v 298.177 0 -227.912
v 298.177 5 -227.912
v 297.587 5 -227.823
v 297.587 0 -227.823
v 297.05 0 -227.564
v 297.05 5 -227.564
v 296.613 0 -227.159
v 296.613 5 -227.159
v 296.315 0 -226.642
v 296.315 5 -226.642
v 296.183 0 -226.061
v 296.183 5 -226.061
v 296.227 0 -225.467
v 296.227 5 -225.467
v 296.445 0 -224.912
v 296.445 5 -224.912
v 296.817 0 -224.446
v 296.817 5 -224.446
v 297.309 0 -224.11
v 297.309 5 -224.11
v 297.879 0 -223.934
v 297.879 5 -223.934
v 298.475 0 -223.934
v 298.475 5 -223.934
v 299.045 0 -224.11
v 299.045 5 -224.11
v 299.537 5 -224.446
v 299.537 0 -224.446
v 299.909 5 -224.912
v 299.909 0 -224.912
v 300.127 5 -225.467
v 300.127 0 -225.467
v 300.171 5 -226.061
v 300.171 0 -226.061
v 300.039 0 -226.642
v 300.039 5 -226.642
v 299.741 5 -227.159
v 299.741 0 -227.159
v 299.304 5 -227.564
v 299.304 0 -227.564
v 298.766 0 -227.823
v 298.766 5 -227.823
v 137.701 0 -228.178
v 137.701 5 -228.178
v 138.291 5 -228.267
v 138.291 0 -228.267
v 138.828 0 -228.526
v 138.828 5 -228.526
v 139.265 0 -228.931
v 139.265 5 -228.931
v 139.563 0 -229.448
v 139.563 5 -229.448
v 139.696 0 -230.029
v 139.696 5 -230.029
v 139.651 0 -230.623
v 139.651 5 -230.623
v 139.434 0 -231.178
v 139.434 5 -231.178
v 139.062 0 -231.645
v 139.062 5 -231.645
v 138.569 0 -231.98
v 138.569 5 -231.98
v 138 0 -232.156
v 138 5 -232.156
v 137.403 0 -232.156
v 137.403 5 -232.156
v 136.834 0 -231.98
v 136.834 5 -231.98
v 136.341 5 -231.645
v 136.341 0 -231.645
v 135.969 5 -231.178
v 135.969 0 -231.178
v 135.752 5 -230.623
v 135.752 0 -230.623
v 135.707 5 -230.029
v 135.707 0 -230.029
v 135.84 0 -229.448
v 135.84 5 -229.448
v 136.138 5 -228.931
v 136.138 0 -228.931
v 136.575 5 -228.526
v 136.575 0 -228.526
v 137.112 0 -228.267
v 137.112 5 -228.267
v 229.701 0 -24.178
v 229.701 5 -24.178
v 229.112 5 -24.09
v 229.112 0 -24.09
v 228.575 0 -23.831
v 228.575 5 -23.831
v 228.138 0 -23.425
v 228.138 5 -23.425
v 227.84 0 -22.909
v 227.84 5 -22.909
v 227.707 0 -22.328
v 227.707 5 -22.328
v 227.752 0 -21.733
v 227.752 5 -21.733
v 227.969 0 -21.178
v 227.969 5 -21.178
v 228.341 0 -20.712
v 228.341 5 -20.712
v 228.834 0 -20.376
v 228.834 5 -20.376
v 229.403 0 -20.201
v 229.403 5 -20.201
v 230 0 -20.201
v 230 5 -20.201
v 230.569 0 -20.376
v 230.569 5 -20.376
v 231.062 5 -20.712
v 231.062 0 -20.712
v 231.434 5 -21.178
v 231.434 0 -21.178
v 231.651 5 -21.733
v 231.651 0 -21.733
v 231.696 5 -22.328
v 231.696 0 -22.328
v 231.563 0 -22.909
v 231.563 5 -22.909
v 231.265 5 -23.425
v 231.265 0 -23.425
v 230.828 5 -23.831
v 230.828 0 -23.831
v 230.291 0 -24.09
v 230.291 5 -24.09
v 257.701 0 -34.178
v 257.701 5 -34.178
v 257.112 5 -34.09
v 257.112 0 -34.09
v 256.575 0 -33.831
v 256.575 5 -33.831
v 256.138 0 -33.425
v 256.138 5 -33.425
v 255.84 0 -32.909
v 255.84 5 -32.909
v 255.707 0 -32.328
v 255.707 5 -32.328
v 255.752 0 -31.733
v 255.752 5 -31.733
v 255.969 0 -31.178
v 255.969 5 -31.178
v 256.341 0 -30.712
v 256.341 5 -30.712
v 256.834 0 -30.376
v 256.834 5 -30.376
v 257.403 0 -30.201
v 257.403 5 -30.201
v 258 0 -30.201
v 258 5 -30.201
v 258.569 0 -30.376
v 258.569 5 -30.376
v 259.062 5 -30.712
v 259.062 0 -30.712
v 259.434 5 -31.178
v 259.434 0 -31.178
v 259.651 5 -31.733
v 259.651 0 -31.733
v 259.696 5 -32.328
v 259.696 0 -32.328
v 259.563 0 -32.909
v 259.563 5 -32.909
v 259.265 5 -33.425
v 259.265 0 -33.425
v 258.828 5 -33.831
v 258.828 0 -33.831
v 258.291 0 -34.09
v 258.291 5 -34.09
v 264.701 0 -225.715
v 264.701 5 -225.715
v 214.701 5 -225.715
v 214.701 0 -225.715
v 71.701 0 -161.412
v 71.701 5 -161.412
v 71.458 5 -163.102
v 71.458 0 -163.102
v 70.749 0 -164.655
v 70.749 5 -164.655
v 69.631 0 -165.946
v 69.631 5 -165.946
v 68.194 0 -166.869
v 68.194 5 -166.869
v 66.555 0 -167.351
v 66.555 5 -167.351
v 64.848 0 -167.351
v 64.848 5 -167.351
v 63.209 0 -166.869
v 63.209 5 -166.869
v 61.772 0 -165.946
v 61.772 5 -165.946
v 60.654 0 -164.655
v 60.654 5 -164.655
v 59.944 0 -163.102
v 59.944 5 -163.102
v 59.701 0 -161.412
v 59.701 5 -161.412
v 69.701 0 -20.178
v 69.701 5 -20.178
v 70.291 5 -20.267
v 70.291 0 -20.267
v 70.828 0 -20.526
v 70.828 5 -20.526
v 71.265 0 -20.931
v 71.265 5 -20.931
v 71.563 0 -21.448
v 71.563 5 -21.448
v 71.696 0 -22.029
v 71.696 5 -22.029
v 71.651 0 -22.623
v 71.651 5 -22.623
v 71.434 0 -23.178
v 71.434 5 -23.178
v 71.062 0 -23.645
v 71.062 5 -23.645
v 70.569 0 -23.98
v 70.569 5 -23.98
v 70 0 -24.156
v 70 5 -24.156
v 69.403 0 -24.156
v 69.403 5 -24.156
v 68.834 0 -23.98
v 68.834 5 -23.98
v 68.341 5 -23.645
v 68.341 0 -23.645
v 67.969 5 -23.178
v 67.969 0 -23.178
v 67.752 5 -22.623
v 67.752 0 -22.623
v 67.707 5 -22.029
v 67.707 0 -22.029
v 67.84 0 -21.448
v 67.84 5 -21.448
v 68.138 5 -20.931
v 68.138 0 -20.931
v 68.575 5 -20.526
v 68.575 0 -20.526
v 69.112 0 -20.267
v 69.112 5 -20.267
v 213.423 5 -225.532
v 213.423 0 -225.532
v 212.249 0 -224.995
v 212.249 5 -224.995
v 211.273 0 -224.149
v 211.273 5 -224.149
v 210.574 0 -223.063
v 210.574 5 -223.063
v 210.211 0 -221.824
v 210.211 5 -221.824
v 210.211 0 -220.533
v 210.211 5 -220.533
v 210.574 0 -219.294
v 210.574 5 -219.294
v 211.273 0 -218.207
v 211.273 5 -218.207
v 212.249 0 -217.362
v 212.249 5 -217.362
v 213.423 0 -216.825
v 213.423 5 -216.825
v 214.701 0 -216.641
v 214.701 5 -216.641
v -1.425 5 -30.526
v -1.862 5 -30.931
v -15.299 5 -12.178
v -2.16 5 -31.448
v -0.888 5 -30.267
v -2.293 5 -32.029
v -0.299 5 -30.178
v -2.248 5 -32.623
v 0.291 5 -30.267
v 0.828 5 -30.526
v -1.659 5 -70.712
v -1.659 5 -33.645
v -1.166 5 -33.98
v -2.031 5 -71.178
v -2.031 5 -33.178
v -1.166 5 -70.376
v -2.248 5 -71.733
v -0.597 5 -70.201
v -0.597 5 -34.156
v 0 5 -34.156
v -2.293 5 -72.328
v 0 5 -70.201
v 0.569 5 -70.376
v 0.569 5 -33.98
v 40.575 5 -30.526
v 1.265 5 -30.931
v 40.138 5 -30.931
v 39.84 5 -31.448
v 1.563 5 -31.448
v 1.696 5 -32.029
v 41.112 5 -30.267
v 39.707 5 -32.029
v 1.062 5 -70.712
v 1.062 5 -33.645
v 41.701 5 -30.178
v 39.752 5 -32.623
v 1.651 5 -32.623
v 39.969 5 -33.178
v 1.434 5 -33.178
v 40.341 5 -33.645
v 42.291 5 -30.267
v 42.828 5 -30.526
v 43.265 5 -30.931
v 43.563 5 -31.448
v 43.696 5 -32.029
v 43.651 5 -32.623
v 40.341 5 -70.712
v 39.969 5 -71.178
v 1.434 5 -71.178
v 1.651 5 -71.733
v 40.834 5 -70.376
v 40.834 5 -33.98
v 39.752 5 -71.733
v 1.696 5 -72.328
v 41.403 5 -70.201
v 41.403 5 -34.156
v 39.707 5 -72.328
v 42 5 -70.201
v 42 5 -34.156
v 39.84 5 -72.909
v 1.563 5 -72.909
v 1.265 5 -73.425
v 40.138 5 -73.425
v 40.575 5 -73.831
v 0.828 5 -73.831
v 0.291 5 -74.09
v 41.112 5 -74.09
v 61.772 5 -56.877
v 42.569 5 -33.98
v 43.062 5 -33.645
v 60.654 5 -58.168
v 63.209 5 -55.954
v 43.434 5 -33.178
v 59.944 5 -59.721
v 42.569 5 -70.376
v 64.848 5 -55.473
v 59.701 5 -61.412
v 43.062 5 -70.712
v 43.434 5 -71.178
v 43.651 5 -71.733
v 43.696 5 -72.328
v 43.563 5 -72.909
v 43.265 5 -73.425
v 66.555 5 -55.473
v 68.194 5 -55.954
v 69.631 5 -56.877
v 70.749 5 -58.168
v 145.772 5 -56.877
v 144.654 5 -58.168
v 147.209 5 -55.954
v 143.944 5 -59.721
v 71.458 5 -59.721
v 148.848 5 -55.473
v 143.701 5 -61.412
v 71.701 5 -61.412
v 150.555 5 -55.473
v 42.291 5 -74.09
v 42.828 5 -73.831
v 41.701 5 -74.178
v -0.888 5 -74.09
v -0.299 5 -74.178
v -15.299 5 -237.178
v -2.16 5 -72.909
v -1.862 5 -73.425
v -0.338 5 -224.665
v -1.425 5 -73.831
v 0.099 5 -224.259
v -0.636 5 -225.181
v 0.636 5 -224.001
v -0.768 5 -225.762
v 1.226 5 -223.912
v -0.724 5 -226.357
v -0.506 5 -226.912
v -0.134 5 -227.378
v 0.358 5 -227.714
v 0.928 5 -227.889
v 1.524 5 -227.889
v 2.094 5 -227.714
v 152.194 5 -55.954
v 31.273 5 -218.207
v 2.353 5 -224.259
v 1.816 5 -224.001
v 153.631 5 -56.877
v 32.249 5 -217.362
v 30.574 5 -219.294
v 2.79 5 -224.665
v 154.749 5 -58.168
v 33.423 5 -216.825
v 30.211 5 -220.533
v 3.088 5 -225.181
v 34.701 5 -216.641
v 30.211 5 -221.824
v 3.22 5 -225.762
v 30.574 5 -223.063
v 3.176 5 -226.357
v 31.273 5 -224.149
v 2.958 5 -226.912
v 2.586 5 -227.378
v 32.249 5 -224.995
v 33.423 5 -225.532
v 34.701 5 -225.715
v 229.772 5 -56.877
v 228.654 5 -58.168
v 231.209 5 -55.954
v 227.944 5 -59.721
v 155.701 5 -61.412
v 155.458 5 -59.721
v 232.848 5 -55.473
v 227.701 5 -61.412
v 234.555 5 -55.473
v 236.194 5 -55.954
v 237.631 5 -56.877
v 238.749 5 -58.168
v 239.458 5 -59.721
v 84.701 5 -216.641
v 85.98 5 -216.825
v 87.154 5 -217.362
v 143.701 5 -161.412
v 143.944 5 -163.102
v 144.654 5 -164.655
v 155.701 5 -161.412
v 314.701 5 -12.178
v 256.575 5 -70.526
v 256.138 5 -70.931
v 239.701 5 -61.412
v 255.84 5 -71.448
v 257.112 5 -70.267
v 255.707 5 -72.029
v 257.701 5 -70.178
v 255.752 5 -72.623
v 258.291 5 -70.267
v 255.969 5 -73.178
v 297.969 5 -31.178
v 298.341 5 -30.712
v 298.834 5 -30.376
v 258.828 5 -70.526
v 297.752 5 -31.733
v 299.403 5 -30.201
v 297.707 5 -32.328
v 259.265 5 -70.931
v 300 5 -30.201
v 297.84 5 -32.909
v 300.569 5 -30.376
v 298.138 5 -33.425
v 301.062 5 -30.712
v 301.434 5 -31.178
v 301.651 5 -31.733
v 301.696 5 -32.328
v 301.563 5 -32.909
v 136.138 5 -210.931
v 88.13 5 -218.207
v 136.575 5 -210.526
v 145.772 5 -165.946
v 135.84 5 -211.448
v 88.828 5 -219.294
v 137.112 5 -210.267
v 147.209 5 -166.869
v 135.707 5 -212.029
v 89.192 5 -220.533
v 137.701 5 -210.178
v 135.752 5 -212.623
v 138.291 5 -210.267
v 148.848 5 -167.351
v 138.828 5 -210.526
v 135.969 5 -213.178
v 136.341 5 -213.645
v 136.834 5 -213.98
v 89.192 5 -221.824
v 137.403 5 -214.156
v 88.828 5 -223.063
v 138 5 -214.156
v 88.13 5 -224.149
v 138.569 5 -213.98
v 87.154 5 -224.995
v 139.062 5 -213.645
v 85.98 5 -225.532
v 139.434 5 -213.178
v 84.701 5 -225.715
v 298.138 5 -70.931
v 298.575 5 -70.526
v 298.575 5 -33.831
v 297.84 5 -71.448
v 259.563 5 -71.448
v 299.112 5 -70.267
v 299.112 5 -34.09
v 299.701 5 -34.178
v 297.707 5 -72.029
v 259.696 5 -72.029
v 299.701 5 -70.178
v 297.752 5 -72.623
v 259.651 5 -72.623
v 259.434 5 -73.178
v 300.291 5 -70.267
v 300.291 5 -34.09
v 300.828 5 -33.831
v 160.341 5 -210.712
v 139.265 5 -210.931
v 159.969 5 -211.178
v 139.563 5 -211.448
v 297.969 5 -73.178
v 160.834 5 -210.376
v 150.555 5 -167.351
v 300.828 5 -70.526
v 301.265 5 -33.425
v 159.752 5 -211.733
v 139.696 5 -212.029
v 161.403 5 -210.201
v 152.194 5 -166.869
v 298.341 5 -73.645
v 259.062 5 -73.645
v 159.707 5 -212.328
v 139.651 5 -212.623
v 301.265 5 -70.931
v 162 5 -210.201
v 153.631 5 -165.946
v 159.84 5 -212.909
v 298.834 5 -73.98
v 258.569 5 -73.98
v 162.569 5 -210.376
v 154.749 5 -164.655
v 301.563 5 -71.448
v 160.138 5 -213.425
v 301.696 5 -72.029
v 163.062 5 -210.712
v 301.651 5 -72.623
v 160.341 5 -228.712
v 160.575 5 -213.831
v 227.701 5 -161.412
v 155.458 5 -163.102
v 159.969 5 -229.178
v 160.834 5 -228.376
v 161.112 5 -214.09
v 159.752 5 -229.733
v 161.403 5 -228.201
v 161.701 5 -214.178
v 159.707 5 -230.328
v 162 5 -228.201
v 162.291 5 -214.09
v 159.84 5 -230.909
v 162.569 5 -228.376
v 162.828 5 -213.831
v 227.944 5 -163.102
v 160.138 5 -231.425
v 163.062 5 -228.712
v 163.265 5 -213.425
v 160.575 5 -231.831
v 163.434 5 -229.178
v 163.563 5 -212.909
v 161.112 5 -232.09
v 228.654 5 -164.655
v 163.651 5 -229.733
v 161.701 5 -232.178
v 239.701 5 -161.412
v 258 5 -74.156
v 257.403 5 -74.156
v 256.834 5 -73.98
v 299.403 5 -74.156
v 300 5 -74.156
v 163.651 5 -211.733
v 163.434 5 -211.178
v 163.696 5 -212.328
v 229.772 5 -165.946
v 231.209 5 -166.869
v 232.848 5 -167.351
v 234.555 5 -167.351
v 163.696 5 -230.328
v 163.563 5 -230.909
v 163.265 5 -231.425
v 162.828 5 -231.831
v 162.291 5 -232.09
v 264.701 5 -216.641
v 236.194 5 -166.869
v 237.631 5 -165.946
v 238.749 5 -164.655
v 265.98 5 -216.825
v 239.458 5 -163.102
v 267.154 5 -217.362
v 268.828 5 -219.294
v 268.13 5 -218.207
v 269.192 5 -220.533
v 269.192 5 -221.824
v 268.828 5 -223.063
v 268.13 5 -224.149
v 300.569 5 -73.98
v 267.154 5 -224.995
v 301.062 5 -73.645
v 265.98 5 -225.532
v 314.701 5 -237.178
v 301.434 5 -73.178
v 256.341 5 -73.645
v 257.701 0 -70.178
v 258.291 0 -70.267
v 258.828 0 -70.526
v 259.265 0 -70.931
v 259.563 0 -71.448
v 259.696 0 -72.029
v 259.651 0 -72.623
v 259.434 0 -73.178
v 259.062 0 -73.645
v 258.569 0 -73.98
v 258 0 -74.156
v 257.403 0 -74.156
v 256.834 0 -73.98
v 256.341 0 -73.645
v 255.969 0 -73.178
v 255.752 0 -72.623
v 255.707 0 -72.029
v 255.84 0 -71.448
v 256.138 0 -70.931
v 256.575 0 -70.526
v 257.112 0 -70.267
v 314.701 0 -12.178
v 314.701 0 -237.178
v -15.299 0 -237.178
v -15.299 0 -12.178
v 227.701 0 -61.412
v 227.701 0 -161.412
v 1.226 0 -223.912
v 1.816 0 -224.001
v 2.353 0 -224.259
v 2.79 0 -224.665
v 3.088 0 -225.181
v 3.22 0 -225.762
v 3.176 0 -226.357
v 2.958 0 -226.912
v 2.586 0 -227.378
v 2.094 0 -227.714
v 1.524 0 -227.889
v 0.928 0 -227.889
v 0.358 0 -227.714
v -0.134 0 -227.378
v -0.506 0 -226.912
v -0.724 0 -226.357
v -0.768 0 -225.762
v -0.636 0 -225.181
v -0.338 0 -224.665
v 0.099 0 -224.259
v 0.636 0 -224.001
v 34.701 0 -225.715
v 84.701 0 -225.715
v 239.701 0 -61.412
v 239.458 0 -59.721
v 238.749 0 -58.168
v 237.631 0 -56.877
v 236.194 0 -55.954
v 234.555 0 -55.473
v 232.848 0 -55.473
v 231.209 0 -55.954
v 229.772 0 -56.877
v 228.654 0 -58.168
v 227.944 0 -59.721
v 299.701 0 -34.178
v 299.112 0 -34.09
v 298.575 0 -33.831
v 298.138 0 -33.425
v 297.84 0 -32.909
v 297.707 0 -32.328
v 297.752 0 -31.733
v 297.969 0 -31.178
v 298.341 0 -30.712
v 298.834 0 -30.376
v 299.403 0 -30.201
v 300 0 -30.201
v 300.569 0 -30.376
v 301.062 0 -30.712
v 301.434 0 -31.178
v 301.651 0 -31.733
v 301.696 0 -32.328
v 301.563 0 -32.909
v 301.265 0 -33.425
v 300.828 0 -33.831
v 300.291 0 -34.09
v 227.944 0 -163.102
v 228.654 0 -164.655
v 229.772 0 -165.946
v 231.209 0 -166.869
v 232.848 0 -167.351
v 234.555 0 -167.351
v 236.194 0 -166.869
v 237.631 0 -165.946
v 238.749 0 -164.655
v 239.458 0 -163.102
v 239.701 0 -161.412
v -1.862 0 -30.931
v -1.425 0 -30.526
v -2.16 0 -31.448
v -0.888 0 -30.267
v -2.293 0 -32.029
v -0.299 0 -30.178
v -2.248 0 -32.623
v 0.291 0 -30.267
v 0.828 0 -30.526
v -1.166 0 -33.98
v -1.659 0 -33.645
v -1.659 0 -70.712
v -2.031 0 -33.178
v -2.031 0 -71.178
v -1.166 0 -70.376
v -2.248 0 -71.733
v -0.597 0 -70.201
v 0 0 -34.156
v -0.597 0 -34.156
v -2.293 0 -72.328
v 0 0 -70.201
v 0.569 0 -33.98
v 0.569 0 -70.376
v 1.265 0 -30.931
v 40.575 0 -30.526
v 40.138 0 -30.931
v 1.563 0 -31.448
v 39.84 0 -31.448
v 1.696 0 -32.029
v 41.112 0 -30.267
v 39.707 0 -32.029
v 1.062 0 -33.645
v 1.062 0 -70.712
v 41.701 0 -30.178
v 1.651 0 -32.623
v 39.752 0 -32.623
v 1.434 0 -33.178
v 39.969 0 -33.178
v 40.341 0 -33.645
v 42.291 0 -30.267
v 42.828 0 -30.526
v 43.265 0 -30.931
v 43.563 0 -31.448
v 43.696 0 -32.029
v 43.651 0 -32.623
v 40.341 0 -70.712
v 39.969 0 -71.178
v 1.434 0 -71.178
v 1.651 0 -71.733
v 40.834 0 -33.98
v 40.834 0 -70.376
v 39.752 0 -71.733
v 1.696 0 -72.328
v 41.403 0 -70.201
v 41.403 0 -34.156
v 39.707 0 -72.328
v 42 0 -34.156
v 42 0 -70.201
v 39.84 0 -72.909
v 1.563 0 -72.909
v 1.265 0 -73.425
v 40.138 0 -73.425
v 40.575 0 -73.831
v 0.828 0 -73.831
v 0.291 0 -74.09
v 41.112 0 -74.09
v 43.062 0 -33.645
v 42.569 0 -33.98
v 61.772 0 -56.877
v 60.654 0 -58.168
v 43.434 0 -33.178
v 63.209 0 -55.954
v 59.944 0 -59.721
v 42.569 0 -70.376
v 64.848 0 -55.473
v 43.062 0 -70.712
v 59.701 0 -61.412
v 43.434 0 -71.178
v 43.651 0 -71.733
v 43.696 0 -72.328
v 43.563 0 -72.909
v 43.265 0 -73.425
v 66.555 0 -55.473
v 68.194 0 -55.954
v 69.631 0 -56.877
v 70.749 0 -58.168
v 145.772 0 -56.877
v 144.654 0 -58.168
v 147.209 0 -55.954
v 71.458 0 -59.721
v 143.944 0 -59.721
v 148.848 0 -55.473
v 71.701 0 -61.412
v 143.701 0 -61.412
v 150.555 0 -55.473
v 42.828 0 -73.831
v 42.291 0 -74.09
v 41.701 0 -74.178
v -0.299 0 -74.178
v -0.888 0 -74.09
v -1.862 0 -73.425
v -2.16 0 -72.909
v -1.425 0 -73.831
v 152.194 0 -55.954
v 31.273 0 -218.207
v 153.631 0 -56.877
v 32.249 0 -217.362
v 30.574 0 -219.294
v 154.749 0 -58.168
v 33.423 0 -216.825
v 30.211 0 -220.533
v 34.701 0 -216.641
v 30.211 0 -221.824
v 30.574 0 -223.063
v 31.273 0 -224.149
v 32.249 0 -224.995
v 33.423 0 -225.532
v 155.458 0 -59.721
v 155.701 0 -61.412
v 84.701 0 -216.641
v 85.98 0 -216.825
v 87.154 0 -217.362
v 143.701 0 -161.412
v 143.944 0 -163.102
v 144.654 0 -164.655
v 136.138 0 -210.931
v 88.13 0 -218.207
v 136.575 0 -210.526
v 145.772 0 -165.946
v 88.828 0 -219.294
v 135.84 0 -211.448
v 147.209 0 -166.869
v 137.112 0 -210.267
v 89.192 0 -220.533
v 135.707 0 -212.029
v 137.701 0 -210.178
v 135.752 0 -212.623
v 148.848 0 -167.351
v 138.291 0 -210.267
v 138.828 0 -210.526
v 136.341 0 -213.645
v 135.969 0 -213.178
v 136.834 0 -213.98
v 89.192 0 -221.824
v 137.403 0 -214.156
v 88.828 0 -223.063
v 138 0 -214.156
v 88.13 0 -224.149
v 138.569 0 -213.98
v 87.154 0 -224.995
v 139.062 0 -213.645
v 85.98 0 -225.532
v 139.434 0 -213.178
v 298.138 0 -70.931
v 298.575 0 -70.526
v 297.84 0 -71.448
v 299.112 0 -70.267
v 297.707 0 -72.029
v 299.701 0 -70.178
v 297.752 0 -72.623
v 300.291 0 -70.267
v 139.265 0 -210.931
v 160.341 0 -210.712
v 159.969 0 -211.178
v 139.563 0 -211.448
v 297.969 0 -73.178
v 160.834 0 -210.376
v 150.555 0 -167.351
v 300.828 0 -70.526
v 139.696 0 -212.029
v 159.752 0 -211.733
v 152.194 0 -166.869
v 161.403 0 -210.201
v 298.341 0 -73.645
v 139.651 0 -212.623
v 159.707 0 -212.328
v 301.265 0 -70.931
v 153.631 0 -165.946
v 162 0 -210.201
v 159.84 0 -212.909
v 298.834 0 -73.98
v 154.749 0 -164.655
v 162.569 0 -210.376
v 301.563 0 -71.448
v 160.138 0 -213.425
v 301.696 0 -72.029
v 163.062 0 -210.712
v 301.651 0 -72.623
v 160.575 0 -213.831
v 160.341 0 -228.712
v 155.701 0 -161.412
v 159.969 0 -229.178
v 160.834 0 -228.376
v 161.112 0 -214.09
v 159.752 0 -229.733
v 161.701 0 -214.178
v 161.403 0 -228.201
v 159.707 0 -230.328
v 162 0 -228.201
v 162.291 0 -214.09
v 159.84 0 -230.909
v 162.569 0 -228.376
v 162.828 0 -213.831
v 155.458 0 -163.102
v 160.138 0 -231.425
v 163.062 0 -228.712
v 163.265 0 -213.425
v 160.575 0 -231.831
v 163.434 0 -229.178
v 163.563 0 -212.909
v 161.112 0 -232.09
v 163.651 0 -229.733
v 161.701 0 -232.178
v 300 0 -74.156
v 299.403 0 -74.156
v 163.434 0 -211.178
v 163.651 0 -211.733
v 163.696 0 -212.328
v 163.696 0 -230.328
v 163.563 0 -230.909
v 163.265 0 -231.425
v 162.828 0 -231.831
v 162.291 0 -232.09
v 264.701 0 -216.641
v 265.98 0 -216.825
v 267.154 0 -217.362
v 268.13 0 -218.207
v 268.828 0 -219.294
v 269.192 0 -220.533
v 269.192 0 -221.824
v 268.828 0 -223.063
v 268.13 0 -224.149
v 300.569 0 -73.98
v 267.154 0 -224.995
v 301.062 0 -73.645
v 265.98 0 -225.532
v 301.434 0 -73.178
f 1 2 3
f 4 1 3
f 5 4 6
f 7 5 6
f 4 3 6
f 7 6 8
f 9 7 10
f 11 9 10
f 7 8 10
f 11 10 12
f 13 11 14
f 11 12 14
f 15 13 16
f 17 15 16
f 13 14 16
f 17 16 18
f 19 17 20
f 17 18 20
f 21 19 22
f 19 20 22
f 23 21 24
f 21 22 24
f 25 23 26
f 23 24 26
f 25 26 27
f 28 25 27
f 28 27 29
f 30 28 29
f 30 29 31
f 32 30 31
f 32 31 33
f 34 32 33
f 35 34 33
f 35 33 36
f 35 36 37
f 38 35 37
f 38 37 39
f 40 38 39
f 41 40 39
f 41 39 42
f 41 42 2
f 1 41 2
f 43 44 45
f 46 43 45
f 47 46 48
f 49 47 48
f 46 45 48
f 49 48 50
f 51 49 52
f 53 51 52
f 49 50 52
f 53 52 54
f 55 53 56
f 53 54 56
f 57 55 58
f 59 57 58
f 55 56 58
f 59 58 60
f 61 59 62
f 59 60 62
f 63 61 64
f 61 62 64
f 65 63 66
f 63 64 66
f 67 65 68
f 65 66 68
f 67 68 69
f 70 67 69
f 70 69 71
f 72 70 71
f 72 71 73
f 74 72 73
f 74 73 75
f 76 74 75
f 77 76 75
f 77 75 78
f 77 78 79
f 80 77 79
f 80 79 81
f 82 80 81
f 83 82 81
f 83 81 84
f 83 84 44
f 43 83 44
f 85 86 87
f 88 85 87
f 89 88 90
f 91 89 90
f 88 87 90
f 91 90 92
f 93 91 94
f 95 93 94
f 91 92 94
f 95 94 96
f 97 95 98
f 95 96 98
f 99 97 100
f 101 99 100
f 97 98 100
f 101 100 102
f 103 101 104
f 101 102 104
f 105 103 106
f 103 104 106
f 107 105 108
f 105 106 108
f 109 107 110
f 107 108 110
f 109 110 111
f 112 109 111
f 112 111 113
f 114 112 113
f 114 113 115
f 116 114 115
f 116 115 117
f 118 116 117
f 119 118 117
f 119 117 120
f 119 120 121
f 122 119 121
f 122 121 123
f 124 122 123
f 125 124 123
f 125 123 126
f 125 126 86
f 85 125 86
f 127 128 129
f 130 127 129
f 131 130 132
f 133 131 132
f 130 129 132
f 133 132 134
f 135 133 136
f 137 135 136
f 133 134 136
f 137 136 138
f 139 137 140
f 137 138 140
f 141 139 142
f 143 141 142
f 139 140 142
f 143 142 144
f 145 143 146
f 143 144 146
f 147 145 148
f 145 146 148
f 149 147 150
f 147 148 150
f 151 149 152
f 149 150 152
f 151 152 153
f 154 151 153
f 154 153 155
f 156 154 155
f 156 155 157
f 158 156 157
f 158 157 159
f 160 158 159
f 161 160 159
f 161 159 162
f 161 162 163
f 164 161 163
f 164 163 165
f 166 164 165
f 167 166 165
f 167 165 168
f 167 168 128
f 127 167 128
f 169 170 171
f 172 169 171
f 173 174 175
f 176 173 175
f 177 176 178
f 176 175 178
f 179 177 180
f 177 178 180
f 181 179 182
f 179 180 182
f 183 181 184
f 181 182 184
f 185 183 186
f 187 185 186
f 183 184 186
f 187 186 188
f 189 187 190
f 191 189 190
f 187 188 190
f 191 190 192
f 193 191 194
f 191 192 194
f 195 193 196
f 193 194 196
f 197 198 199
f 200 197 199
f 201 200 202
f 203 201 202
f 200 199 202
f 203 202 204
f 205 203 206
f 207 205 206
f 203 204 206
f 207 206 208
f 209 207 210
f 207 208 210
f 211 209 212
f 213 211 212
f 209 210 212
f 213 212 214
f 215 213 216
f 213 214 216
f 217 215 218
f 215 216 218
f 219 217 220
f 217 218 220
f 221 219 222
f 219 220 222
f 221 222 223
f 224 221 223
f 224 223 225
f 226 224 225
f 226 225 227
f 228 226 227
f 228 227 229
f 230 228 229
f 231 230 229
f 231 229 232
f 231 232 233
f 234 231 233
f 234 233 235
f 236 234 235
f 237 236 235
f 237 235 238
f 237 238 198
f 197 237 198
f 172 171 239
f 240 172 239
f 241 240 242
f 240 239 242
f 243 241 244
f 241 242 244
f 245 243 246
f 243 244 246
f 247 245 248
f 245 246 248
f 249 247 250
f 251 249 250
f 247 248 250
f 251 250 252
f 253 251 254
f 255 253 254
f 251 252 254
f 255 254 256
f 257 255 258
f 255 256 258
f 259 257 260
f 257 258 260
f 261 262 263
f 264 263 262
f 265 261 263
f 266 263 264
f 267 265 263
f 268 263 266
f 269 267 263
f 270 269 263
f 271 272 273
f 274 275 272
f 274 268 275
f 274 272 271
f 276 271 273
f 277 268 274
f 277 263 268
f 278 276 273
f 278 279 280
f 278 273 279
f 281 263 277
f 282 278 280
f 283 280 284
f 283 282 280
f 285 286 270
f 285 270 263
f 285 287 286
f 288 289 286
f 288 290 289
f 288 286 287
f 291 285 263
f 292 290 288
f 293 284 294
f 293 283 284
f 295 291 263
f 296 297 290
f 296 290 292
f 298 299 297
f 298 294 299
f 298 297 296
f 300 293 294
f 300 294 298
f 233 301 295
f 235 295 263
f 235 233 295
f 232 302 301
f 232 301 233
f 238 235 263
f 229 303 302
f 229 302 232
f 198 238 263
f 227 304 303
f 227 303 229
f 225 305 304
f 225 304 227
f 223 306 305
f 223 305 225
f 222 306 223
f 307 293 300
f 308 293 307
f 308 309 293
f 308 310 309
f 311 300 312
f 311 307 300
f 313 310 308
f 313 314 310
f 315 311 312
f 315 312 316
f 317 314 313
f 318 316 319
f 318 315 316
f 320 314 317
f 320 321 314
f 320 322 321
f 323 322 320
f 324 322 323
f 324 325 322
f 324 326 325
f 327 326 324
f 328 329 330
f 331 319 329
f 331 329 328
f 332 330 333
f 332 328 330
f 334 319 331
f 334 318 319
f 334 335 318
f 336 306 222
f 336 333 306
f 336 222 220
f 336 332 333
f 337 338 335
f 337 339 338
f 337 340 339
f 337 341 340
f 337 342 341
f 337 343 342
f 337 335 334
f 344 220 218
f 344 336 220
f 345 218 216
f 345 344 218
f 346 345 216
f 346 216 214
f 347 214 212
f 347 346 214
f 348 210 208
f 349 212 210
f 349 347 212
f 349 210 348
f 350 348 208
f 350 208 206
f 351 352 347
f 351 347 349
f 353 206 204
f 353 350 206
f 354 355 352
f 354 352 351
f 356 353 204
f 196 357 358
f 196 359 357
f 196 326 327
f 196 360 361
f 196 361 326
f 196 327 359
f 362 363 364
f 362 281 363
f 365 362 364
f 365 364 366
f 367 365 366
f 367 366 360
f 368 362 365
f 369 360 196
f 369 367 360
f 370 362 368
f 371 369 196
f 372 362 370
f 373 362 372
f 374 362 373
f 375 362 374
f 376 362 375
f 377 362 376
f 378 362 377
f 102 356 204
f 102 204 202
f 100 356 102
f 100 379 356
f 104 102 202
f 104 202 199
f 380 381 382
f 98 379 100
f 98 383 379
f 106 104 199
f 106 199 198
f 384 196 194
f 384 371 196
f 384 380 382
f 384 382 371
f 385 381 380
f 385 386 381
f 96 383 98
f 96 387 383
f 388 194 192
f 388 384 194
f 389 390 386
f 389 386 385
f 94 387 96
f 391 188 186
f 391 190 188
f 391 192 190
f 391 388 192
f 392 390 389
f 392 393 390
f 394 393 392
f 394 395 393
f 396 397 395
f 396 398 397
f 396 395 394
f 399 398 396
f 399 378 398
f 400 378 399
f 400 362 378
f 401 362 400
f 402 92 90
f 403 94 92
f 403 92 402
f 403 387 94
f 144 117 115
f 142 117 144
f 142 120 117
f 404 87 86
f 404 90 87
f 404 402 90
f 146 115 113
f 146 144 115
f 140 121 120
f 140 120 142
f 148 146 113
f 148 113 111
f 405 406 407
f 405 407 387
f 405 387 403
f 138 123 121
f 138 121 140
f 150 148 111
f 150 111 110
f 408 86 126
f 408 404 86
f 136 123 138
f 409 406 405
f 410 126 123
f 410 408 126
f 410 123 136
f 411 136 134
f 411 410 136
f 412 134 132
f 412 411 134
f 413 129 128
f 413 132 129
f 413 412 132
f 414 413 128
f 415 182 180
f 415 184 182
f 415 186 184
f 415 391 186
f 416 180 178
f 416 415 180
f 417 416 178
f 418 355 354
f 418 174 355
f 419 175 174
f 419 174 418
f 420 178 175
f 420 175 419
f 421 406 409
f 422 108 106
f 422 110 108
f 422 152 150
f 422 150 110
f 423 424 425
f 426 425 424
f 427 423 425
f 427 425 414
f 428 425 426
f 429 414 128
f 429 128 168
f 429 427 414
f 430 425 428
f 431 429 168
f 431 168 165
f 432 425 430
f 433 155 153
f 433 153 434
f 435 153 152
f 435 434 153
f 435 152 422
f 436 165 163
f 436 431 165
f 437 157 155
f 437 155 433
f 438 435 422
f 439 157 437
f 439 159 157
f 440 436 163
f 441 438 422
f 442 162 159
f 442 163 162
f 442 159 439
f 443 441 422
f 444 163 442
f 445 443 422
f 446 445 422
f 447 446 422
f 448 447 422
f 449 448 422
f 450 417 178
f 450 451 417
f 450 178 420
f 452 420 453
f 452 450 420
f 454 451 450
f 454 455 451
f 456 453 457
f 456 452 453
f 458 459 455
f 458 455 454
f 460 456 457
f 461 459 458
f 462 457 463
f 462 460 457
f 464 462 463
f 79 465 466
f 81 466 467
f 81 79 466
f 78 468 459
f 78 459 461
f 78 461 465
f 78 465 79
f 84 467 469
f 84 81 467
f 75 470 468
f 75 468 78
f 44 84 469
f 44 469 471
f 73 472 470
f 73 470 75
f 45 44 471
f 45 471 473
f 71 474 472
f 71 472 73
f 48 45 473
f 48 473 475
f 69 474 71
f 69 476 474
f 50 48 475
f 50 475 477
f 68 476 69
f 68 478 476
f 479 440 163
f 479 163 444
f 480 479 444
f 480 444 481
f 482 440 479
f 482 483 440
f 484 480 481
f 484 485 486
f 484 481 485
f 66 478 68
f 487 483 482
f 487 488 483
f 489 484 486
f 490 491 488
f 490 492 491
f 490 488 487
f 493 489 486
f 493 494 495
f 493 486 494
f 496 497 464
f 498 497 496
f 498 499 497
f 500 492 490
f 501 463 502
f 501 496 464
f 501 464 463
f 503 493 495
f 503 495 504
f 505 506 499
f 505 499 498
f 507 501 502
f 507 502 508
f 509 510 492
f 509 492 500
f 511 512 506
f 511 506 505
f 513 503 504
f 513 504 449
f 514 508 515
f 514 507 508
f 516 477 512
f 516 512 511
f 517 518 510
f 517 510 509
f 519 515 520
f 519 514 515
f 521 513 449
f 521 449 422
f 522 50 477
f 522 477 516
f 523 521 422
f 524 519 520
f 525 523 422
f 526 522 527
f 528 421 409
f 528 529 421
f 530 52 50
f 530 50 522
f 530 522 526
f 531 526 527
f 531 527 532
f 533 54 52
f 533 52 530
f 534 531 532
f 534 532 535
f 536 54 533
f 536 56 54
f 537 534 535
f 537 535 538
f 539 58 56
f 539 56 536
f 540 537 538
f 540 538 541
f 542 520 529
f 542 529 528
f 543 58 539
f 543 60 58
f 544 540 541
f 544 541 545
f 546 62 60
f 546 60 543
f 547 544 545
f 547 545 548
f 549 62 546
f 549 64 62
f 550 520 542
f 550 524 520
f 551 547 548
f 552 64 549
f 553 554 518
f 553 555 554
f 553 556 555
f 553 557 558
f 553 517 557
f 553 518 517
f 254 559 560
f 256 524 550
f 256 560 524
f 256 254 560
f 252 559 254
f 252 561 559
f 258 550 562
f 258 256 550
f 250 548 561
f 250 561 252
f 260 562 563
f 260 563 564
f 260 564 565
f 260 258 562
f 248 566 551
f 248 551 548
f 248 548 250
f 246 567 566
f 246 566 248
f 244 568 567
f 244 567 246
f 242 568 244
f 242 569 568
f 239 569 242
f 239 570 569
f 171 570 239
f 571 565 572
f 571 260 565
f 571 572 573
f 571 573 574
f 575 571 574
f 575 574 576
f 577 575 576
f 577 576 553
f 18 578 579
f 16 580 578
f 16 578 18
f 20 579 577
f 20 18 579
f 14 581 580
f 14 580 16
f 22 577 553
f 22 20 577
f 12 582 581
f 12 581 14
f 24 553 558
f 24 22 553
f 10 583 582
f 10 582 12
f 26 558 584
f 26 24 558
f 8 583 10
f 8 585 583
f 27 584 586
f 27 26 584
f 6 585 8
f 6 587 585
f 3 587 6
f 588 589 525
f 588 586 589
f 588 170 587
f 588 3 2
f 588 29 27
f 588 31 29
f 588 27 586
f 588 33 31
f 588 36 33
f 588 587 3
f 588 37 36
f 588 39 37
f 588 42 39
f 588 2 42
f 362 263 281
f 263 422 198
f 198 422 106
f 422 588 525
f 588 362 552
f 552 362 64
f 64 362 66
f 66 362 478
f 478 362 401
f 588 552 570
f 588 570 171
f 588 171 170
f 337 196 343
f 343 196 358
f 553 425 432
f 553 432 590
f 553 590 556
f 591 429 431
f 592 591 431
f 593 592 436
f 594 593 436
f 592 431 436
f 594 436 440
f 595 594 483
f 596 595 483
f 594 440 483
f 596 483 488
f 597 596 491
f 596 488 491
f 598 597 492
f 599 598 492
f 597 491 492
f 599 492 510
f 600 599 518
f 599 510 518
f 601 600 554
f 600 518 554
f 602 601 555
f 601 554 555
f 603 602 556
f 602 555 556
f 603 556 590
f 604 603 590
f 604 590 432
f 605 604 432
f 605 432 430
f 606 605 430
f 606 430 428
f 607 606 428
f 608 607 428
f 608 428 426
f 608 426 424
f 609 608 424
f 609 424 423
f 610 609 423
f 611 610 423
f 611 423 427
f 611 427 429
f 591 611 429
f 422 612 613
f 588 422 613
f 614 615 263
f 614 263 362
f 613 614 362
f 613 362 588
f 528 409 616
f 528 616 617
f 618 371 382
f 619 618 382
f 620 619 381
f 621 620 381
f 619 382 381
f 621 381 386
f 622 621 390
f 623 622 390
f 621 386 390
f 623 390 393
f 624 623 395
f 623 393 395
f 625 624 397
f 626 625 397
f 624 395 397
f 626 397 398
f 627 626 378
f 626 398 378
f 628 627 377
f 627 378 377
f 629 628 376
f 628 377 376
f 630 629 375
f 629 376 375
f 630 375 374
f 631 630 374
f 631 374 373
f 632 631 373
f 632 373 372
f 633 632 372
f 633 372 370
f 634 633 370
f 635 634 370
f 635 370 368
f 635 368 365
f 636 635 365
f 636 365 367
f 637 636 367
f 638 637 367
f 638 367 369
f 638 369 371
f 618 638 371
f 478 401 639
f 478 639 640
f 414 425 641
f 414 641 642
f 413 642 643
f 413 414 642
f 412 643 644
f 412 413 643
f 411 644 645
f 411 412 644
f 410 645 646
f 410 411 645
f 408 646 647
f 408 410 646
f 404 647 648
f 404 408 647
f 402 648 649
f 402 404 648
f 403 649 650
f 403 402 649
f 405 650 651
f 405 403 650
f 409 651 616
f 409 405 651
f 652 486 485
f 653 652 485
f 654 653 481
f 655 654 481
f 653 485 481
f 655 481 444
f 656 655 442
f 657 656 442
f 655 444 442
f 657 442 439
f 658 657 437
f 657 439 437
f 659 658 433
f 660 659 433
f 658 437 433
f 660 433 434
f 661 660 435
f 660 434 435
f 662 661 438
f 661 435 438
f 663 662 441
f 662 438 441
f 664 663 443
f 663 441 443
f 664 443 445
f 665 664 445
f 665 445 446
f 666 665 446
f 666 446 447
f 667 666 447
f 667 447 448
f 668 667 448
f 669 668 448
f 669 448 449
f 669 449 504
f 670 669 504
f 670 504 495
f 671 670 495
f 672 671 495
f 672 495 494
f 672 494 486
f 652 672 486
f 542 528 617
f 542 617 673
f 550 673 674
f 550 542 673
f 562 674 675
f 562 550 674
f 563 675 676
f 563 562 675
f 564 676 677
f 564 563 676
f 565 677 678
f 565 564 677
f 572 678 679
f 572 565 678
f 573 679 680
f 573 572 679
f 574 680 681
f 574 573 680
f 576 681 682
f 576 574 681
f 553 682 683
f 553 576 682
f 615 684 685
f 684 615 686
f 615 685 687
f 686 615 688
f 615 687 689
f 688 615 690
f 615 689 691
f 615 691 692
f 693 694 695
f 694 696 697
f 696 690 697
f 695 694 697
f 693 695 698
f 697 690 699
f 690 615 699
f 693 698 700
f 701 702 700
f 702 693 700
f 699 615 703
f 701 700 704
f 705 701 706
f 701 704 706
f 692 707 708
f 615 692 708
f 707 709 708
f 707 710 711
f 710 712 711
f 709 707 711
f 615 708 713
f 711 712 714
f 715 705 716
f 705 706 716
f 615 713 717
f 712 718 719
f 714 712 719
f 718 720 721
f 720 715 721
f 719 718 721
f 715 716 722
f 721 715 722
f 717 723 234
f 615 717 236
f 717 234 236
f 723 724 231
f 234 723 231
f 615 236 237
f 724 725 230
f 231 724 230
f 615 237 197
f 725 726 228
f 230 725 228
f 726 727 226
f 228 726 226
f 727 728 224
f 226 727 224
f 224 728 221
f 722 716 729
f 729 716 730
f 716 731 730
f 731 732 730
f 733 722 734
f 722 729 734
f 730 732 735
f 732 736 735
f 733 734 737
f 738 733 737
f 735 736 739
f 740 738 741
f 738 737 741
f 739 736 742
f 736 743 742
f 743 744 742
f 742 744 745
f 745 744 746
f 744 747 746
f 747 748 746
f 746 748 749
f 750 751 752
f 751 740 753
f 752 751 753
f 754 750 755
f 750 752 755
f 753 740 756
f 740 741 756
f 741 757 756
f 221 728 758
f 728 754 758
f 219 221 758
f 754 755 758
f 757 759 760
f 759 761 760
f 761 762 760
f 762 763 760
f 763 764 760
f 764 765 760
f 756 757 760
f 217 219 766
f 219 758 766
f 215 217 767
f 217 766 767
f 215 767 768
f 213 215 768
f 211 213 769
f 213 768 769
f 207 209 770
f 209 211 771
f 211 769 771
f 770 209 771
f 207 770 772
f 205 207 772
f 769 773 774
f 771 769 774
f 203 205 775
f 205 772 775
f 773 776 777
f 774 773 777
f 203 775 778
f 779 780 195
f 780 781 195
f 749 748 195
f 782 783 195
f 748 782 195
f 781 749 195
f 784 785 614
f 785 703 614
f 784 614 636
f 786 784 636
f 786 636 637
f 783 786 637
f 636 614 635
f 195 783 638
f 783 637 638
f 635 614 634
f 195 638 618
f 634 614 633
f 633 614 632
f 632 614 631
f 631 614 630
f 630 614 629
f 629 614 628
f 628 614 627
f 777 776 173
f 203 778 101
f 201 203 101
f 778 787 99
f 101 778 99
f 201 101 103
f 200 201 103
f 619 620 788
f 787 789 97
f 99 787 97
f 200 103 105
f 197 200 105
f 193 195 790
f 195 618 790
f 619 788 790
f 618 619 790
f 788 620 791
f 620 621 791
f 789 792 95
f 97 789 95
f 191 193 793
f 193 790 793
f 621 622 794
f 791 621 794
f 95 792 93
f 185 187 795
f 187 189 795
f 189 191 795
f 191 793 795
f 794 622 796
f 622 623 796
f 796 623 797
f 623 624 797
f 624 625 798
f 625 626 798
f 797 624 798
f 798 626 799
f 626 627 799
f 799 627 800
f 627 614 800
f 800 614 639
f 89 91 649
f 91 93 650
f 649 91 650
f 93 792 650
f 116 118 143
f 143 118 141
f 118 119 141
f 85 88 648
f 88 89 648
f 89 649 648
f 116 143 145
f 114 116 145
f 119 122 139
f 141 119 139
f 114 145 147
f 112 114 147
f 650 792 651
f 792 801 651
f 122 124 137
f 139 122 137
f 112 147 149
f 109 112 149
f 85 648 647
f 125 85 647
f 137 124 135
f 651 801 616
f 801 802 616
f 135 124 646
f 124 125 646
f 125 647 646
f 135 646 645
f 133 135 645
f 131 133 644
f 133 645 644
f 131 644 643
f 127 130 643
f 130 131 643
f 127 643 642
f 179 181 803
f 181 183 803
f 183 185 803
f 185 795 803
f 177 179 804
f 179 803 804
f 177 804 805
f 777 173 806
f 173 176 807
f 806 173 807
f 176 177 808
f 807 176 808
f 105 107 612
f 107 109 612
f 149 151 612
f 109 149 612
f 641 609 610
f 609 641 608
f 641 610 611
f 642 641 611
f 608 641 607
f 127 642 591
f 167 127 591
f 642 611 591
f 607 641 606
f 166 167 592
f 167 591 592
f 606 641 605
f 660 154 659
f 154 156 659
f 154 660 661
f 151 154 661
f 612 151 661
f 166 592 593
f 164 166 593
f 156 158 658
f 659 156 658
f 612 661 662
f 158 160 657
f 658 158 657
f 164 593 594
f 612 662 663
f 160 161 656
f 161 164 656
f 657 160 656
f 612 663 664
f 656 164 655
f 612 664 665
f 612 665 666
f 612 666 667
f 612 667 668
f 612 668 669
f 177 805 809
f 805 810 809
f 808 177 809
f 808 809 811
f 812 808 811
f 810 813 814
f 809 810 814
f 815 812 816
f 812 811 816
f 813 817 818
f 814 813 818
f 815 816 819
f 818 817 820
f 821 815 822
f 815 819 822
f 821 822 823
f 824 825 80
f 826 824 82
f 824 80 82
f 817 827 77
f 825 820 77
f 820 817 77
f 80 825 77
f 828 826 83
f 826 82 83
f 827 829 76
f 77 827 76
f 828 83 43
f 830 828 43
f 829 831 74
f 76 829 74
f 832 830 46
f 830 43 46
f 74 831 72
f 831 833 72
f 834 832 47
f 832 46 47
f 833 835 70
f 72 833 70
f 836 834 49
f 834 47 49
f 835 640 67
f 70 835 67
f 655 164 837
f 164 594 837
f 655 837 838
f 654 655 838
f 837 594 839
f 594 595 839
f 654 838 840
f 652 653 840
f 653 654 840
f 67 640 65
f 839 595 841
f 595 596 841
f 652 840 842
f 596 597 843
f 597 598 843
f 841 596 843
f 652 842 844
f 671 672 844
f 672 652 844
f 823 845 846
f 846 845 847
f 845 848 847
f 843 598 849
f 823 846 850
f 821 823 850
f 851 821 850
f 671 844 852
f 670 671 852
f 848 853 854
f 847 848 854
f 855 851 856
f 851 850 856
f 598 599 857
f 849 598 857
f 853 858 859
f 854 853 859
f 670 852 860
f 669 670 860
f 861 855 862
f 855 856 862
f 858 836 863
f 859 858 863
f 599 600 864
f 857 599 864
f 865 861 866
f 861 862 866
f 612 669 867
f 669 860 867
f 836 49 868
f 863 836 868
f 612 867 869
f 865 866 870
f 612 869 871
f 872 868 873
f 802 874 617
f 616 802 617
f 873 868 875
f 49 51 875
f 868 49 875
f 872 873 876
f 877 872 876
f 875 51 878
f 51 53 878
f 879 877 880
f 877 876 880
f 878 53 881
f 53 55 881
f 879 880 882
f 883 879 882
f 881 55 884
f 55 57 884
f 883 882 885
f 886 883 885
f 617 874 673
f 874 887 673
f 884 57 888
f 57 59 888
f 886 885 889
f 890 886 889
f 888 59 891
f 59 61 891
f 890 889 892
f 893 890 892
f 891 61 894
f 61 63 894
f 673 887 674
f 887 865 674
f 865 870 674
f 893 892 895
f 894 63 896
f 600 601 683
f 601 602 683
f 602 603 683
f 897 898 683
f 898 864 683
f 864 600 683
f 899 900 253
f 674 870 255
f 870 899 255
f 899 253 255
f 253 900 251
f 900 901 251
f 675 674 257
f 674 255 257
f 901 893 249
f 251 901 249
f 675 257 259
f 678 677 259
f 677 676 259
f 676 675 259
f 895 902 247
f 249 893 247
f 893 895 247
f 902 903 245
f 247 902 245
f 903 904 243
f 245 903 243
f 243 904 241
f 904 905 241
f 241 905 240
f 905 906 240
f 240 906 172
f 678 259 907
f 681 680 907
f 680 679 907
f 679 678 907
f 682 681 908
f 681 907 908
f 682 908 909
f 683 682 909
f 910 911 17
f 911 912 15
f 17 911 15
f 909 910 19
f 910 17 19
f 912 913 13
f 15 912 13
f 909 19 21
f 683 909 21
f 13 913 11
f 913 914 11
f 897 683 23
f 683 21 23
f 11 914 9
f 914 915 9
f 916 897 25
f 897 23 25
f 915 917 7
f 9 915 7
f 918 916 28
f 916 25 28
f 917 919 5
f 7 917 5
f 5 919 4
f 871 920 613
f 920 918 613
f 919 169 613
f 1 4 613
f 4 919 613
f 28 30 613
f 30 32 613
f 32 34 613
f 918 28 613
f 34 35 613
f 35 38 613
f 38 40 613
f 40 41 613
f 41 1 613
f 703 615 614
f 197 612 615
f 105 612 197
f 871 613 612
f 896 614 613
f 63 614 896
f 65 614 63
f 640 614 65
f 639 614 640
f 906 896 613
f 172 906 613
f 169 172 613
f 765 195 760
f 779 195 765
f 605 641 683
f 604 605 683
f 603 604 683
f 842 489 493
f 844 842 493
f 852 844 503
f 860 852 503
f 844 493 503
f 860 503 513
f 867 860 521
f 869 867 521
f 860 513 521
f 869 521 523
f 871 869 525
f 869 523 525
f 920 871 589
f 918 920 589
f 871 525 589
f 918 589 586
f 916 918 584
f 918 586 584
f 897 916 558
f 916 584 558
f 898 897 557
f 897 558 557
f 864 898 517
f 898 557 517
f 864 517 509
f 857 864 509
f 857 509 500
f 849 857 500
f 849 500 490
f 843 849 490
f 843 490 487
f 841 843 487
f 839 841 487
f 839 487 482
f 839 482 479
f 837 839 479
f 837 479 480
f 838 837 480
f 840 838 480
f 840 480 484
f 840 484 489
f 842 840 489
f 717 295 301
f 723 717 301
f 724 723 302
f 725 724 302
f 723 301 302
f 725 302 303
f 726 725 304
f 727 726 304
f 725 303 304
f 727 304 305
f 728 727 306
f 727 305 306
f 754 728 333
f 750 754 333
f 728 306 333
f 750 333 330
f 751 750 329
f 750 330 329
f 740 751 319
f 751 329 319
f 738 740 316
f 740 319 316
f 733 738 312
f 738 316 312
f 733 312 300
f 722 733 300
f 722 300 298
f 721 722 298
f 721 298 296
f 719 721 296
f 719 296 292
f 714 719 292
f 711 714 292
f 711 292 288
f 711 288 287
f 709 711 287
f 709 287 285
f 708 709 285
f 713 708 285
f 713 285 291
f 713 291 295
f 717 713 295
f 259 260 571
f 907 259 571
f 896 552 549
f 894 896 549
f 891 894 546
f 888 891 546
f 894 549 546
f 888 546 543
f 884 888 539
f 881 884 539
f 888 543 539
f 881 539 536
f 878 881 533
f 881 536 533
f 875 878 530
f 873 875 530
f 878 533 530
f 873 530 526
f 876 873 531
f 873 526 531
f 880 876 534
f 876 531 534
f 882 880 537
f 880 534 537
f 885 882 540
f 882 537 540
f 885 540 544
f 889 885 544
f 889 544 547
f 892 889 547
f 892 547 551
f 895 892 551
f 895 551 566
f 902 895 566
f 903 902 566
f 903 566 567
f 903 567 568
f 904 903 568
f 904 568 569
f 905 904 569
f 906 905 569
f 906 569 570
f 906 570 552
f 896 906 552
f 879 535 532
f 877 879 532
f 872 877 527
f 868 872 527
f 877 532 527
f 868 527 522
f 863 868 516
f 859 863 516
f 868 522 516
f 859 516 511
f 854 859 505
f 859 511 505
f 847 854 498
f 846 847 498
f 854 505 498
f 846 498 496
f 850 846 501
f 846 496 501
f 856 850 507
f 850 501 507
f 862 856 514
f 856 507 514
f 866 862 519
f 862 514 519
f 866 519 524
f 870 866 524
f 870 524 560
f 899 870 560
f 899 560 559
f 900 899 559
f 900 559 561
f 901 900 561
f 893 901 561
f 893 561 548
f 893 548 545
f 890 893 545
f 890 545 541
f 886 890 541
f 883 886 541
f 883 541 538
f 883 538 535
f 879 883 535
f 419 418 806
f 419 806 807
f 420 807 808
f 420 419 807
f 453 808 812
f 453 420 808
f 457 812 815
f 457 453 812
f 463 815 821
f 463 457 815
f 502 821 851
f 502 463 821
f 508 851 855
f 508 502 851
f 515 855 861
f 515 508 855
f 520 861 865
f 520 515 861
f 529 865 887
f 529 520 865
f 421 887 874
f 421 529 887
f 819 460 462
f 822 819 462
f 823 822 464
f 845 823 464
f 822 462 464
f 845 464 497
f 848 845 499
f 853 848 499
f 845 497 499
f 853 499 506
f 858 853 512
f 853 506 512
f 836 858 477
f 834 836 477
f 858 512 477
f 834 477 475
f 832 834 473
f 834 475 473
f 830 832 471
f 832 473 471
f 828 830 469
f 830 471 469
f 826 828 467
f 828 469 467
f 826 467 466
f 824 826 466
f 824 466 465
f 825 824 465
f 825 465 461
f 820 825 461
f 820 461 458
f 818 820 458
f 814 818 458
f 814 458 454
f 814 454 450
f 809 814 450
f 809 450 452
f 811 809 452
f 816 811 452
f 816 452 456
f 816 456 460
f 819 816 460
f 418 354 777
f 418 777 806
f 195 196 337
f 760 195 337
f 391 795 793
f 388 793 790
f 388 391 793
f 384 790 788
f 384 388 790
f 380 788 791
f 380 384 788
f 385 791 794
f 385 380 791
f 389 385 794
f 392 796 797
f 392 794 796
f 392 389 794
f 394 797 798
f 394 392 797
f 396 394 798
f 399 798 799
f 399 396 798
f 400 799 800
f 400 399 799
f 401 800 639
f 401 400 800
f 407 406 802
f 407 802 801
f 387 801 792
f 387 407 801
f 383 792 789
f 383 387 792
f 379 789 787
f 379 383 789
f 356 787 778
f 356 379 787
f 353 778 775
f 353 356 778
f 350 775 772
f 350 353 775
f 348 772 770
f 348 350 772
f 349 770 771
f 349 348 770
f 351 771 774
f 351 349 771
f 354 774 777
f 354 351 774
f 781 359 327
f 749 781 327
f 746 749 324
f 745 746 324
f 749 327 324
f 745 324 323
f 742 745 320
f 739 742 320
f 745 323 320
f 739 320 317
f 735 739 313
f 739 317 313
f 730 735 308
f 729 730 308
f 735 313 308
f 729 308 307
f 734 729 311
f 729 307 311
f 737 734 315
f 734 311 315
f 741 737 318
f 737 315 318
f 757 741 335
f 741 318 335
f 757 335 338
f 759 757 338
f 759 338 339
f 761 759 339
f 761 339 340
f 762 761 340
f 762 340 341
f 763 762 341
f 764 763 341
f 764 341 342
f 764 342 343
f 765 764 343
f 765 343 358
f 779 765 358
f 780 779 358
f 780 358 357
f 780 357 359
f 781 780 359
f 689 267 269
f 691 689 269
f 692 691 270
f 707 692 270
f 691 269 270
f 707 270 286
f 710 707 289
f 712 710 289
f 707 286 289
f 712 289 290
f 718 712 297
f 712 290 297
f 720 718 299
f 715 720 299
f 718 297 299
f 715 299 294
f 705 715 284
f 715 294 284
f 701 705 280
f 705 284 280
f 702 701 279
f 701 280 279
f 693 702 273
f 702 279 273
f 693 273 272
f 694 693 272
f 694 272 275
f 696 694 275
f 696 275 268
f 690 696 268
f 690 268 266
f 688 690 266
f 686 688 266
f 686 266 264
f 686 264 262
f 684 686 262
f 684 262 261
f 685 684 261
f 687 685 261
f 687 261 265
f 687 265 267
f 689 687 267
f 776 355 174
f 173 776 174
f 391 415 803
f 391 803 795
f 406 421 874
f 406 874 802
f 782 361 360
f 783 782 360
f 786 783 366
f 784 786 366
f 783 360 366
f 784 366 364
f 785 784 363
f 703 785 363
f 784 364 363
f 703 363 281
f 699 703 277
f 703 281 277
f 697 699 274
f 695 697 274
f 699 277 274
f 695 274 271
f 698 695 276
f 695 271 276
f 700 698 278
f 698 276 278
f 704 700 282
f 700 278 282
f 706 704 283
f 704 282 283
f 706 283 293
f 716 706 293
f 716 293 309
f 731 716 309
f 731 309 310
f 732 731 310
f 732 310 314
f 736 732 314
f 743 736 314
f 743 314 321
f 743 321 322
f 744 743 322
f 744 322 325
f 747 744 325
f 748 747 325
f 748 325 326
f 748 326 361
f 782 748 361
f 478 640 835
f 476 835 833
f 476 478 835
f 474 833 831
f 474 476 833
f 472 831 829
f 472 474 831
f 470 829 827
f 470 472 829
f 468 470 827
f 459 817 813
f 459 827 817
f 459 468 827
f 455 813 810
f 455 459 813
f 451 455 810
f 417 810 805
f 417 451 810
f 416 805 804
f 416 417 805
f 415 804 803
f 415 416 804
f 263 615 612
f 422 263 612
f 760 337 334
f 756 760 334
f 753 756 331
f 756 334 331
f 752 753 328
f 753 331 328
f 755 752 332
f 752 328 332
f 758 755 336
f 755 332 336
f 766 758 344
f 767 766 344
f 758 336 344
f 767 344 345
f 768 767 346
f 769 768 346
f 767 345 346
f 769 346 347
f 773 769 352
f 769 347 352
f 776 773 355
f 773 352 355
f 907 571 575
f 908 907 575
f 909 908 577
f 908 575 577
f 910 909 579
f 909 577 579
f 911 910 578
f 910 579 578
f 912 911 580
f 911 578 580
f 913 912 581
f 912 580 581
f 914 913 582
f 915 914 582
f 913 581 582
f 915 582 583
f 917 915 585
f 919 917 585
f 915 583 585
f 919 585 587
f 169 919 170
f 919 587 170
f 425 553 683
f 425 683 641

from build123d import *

# Parameters (mm, degrees)
SKETCH_1_W          = 330
SKETCH_1_H          = 225
EXTRUDE_1_DEPTH     = 5
SKETCH_2_R          = 2
CUT_EXTRUDE_1_DEPTH = 395.101001153
SKETCH_3_R          = 2
CUT_EXTRUDE_2_DEPTH = 395.101001153
CUT_EXTRUDE_4_DEPTH = 395.101001153
SKETCH_6_R          = 2
CUT_EXTRUDE_5_DEPTH = 395.101001153


with BuildPart() as part:
    # 草图1 → 凸台-拉伸1 (new body)
    with BuildSketch(Plane(origin=(0, 0, 0), x_dir=(1, 0, 0), z_dir=(0, 1, 0))):
        with Locations((149.701456311, 124.678398058)):
            Rectangle(SKETCH_1_W, SKETCH_1_H)
    extrude(amount=EXTRUDE_1_DEPTH)

    # 草图2 → 切除-拉伸1 (cut, through all)
    with BuildSketch(Plane(origin=(0, 5, 0), x_dir=(1, 0, 0), z_dir=(0, 1, 0))):
        with Locations(Location((137.701456311, 230.178398058, 0), (0, 0, 270))):
            Circle(SKETCH_2_R)
        with Locations(Location((161.701456311, 230.178398058, 0), (0, 0, 90))):
            Circle(SKETCH_2_R)
        with Locations(Location((137.701456311, 212.178398058, 0), (0, 0, 270))):
            Circle(SKETCH_2_R)
        with Locations(Location((161.701456311, 212.178398058, 0), (0, 0, 90))):
            Circle(SKETCH_2_R)
        with BuildLine():
            Line((34.701456311, 225.715369926), (84.701456311, 225.715369926))
            ThreePointArc((84.701456311, 225.715369926), (89.238428179, 221.178398058), (84.701456311, 216.64142619))
            Line((84.701456311, 216.64142619), (34.701456311, 216.64142619))
            ThreePointArc((34.701456311, 216.64142619), (30.164484443, 221.178398058), (34.701456311, 225.715369926))
        make_face()
        with BuildLine():
            Line((264.701456311, 225.715369926), (214.701456311, 225.715369926))
            ThreePointArc((214.701456311, 225.715369926), (210.164484443, 221.178398058), (214.701456311, 216.64142619))
            Line((214.701456311, 216.64142619), (264.701456311, 216.64142619))
            ThreePointArc((264.701456311, 216.64142619), (269.238428179, 221.178398058), (264.701456311, 225.715369926))
        make_face()
    extrude(amount=-CUT_EXTRUDE_1_DEPTH, mode=Mode.SUBTRACT)

    # 草图3 → 切除-拉伸2 (cut, through all)
    with BuildSketch(Plane(origin=(0, 5, 0), x_dir=(1, 0, 0), z_dir=(0, 1, 0))):
        with Locations(Location((-0.298543689, 32.178398058, 0), (0, 0, 270))):
            Circle(SKETCH_3_R)
        with Locations(Location((-0.298543689, 72.178398058, 0), (0, 0, 90))):
            Circle(SKETCH_3_R)
        with Locations(Location((41.701456311, 32.178398058, 0), (0, 0, 270))):
            Circle(SKETCH_3_R)
        with Locations(Location((41.701456311, 72.178398058, 0), (0, 0, 90))):
            Circle(SKETCH_3_R)
        with Locations(Location((257.701456311, 72.178398058, 0), (0, 0, 270))):
            Circle(SKETCH_3_R)
        with Locations(Location((257.701456311, 32.178398058, 0), (0, 0, 90))):
            Circle(SKETCH_3_R)
        with Locations(Location((299.701456311, 72.178398058, 0), (0, 0, 270))):
            Circle(SKETCH_3_R)
        with Locations(Location((299.701456311, 32.178398058, 0), (0, 0, 90))):
            Circle(SKETCH_3_R)
    extrude(amount=-CUT_EXTRUDE_2_DEPTH, mode=Mode.SUBTRACT)

    # 草图5 → 切除-拉伸4 (cut, through all)
    with BuildSketch(Plane(origin=(0, 5, 0), x_dir=(1, 0, 0), z_dir=(0, 1, 0))):
        with BuildLine():
            Line((155.701456311, 161.411602286), (155.701456311, 61.411602286))
            ThreePointArc((155.701456311, 61.411602286), (149.701456311, 55.411602286), (143.701456311, 61.411602286))
            Line((143.701456311, 61.411602286), (143.701456311, 161.411602286))
            ThreePointArc((143.701456311, 161.411602286), (149.701456311, 167.411602286), (155.701456311, 161.411602286))
        make_face()
        with BuildLine():
            Line((239.701456311, 161.411602286), (239.701456311, 61.411602286))
            ThreePointArc((239.701456311, 61.411602286), (233.701456311, 55.411602286), (227.701456311, 61.411602286))
            Line((227.701456311, 61.411602286), (227.701456311, 161.411602286))
            ThreePointArc((227.701456311, 161.411602286), (233.701456311, 167.411602286), (239.701456311, 161.411602286))
        make_face()
        with BuildLine():
            Line((59.701456311, 161.411602286), (59.701456311, 61.411602286))
            ThreePointArc((59.701456311, 61.411602286), (65.701456311, 55.411602286), (71.701456311, 61.411602286))
            Line((71.701456311, 61.411602286), (71.701456311, 161.411602286))
            ThreePointArc((71.701456311, 161.411602286), (65.701456311, 167.411602286), (59.701456311, 161.411602286))
        make_face()
    extrude(amount=-CUT_EXTRUDE_4_DEPTH, mode=Mode.SUBTRACT)

    # 草图6 → 切除-拉伸5 (cut, through all)
    with BuildSketch(Plane(origin=(0, 5, 0), x_dir=(1, 0, 0), z_dir=(0, 1, 0))):
        with Locations(Location((1.226003167, 225.911661565, 0), (0, 0, 270))):
            Circle(SKETCH_6_R)
        with Locations(Location((298.176909455, 225.911661565, 0), (0, 0, 90))):
            Circle(SKETCH_6_R)
        with Locations(Location((69.701456311, 22.178398058, 0), (0, 0, 270))):
            Circle(SKETCH_6_R)
        with Locations(Location((229.701456311, 22.178398058, 0), (0, 0, 90))):
            Circle(SKETCH_6_R)
    extrude(amount=-CUT_EXTRUDE_5_DEPTH, mode=Mode.SUBTRACT)


solid = part.part
